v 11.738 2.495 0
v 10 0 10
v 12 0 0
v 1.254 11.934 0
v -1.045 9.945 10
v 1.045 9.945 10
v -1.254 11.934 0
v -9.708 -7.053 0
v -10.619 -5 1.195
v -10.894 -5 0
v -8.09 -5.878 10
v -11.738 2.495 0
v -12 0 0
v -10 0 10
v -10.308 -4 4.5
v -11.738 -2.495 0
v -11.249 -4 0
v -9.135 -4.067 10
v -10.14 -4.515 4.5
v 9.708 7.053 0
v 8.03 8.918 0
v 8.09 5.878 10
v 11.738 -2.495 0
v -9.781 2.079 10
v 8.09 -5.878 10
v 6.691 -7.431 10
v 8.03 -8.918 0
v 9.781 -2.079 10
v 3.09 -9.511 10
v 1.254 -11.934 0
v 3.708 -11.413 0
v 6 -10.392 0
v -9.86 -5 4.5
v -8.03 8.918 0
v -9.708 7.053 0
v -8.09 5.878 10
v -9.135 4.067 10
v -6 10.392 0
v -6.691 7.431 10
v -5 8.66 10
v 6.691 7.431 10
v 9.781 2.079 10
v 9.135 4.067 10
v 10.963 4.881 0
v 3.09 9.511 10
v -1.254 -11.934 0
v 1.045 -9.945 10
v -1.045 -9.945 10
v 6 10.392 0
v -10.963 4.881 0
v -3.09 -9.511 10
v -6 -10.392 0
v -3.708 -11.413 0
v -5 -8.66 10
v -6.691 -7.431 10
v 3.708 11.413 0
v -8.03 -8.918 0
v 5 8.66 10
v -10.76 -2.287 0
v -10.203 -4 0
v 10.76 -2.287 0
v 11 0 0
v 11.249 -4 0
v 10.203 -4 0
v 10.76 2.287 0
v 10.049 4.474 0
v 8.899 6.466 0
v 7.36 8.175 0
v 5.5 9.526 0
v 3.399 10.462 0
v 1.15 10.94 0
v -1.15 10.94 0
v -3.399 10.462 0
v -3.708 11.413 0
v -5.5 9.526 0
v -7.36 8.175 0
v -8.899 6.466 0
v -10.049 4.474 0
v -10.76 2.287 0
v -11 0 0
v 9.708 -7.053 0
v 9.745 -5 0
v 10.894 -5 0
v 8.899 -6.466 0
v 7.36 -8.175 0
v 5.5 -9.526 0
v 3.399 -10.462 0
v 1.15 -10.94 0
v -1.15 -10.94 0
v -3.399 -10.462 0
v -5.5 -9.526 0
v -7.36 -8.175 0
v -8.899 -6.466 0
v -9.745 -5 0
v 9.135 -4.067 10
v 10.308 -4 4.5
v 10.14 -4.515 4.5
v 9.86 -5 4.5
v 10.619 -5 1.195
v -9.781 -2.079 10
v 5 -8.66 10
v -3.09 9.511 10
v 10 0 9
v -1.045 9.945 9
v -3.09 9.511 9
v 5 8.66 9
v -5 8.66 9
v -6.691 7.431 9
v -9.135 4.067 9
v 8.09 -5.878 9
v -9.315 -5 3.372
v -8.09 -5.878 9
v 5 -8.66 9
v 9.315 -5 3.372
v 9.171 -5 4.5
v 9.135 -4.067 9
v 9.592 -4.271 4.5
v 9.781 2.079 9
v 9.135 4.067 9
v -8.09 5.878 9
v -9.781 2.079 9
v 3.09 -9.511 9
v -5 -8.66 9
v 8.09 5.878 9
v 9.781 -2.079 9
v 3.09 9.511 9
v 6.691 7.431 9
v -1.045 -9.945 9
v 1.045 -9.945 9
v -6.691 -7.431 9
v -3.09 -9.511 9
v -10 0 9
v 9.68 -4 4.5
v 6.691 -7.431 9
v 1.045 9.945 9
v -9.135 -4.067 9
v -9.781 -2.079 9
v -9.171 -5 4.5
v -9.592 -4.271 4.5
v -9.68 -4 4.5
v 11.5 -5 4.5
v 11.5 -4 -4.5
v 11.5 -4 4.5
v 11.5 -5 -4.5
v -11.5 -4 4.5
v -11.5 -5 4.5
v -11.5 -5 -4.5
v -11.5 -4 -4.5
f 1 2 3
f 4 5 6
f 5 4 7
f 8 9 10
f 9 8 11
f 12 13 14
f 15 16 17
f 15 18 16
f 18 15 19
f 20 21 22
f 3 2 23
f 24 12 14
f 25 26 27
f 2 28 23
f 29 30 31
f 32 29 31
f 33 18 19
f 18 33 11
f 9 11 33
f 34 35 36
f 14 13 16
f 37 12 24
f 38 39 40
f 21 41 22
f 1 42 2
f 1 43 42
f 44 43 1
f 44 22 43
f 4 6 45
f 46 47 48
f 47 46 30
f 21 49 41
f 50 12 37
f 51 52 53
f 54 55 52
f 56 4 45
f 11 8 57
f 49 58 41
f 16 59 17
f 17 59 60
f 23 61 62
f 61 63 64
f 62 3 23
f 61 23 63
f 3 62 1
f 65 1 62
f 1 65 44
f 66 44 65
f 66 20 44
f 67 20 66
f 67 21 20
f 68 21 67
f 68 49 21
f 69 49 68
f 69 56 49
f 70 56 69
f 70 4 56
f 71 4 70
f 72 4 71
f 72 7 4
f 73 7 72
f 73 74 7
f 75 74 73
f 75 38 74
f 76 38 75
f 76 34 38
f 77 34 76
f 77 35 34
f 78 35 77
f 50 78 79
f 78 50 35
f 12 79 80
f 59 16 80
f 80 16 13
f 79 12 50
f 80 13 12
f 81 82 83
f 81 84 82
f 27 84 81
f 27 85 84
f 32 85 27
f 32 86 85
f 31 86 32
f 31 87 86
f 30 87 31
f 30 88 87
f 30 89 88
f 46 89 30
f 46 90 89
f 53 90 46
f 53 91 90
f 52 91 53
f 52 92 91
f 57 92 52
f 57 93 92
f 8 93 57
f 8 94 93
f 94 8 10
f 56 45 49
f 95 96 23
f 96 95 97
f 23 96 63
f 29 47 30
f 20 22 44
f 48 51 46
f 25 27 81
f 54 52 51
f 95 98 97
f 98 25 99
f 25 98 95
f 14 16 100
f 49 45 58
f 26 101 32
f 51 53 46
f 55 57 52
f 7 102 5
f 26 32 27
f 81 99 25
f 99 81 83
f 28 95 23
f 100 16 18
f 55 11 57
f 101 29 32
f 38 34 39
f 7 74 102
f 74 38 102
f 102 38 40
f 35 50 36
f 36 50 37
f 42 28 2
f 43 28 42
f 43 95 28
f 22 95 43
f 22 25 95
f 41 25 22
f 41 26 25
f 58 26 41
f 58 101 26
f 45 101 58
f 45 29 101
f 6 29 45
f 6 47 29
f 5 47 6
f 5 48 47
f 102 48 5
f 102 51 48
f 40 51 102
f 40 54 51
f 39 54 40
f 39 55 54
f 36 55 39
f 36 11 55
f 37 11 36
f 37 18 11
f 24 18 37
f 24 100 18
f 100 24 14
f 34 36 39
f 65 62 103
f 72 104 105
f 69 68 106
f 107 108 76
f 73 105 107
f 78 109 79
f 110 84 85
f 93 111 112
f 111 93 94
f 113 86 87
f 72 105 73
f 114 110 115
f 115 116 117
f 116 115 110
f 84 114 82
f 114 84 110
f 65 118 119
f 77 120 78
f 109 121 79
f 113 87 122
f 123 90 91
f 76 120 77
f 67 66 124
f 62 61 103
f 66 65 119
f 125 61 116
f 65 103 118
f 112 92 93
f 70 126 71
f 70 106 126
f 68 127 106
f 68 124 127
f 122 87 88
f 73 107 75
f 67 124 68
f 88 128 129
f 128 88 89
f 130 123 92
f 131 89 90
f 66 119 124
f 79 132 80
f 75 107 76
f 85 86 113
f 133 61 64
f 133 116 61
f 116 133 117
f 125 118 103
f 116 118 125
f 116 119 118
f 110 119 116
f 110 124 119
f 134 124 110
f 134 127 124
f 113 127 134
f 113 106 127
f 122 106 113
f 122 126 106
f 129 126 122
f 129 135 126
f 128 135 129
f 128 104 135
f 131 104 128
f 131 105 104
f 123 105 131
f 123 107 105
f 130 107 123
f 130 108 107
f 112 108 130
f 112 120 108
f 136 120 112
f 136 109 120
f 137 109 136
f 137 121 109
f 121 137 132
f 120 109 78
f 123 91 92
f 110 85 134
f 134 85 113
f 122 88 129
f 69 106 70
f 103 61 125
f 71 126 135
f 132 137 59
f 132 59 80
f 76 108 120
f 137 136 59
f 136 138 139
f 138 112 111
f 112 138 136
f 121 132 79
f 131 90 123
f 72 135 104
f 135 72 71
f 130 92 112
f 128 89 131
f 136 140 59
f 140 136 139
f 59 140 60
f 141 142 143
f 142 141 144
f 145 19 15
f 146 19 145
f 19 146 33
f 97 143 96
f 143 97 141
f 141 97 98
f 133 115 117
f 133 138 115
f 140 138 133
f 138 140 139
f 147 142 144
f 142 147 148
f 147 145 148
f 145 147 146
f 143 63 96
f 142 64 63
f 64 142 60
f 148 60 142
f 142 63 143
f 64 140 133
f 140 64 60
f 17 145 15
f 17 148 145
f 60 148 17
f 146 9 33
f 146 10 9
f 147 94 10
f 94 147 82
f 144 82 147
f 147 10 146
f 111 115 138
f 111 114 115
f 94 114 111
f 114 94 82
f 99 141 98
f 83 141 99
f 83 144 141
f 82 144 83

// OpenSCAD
module example003()
{
	/*
	difference() {
		union() {
			cylinder(r1 = 6, r2 = 4, h = 10);
		}
		union() {
			cylinder(r1 = 5.5, r2 = 3, h = 9);
		}
	}
	*/
	union() {
		difference() {
			union() {
				cylinder(r1 = 12, r2 = 10, h = 10);
			}
			union() {
				cylinder(r1 = 11, r2 = 10, h = 9);
			}
		}
		translate([0,-4.5])cube([ 23, 1, 9 ], center = true);
	}
}

example003();
